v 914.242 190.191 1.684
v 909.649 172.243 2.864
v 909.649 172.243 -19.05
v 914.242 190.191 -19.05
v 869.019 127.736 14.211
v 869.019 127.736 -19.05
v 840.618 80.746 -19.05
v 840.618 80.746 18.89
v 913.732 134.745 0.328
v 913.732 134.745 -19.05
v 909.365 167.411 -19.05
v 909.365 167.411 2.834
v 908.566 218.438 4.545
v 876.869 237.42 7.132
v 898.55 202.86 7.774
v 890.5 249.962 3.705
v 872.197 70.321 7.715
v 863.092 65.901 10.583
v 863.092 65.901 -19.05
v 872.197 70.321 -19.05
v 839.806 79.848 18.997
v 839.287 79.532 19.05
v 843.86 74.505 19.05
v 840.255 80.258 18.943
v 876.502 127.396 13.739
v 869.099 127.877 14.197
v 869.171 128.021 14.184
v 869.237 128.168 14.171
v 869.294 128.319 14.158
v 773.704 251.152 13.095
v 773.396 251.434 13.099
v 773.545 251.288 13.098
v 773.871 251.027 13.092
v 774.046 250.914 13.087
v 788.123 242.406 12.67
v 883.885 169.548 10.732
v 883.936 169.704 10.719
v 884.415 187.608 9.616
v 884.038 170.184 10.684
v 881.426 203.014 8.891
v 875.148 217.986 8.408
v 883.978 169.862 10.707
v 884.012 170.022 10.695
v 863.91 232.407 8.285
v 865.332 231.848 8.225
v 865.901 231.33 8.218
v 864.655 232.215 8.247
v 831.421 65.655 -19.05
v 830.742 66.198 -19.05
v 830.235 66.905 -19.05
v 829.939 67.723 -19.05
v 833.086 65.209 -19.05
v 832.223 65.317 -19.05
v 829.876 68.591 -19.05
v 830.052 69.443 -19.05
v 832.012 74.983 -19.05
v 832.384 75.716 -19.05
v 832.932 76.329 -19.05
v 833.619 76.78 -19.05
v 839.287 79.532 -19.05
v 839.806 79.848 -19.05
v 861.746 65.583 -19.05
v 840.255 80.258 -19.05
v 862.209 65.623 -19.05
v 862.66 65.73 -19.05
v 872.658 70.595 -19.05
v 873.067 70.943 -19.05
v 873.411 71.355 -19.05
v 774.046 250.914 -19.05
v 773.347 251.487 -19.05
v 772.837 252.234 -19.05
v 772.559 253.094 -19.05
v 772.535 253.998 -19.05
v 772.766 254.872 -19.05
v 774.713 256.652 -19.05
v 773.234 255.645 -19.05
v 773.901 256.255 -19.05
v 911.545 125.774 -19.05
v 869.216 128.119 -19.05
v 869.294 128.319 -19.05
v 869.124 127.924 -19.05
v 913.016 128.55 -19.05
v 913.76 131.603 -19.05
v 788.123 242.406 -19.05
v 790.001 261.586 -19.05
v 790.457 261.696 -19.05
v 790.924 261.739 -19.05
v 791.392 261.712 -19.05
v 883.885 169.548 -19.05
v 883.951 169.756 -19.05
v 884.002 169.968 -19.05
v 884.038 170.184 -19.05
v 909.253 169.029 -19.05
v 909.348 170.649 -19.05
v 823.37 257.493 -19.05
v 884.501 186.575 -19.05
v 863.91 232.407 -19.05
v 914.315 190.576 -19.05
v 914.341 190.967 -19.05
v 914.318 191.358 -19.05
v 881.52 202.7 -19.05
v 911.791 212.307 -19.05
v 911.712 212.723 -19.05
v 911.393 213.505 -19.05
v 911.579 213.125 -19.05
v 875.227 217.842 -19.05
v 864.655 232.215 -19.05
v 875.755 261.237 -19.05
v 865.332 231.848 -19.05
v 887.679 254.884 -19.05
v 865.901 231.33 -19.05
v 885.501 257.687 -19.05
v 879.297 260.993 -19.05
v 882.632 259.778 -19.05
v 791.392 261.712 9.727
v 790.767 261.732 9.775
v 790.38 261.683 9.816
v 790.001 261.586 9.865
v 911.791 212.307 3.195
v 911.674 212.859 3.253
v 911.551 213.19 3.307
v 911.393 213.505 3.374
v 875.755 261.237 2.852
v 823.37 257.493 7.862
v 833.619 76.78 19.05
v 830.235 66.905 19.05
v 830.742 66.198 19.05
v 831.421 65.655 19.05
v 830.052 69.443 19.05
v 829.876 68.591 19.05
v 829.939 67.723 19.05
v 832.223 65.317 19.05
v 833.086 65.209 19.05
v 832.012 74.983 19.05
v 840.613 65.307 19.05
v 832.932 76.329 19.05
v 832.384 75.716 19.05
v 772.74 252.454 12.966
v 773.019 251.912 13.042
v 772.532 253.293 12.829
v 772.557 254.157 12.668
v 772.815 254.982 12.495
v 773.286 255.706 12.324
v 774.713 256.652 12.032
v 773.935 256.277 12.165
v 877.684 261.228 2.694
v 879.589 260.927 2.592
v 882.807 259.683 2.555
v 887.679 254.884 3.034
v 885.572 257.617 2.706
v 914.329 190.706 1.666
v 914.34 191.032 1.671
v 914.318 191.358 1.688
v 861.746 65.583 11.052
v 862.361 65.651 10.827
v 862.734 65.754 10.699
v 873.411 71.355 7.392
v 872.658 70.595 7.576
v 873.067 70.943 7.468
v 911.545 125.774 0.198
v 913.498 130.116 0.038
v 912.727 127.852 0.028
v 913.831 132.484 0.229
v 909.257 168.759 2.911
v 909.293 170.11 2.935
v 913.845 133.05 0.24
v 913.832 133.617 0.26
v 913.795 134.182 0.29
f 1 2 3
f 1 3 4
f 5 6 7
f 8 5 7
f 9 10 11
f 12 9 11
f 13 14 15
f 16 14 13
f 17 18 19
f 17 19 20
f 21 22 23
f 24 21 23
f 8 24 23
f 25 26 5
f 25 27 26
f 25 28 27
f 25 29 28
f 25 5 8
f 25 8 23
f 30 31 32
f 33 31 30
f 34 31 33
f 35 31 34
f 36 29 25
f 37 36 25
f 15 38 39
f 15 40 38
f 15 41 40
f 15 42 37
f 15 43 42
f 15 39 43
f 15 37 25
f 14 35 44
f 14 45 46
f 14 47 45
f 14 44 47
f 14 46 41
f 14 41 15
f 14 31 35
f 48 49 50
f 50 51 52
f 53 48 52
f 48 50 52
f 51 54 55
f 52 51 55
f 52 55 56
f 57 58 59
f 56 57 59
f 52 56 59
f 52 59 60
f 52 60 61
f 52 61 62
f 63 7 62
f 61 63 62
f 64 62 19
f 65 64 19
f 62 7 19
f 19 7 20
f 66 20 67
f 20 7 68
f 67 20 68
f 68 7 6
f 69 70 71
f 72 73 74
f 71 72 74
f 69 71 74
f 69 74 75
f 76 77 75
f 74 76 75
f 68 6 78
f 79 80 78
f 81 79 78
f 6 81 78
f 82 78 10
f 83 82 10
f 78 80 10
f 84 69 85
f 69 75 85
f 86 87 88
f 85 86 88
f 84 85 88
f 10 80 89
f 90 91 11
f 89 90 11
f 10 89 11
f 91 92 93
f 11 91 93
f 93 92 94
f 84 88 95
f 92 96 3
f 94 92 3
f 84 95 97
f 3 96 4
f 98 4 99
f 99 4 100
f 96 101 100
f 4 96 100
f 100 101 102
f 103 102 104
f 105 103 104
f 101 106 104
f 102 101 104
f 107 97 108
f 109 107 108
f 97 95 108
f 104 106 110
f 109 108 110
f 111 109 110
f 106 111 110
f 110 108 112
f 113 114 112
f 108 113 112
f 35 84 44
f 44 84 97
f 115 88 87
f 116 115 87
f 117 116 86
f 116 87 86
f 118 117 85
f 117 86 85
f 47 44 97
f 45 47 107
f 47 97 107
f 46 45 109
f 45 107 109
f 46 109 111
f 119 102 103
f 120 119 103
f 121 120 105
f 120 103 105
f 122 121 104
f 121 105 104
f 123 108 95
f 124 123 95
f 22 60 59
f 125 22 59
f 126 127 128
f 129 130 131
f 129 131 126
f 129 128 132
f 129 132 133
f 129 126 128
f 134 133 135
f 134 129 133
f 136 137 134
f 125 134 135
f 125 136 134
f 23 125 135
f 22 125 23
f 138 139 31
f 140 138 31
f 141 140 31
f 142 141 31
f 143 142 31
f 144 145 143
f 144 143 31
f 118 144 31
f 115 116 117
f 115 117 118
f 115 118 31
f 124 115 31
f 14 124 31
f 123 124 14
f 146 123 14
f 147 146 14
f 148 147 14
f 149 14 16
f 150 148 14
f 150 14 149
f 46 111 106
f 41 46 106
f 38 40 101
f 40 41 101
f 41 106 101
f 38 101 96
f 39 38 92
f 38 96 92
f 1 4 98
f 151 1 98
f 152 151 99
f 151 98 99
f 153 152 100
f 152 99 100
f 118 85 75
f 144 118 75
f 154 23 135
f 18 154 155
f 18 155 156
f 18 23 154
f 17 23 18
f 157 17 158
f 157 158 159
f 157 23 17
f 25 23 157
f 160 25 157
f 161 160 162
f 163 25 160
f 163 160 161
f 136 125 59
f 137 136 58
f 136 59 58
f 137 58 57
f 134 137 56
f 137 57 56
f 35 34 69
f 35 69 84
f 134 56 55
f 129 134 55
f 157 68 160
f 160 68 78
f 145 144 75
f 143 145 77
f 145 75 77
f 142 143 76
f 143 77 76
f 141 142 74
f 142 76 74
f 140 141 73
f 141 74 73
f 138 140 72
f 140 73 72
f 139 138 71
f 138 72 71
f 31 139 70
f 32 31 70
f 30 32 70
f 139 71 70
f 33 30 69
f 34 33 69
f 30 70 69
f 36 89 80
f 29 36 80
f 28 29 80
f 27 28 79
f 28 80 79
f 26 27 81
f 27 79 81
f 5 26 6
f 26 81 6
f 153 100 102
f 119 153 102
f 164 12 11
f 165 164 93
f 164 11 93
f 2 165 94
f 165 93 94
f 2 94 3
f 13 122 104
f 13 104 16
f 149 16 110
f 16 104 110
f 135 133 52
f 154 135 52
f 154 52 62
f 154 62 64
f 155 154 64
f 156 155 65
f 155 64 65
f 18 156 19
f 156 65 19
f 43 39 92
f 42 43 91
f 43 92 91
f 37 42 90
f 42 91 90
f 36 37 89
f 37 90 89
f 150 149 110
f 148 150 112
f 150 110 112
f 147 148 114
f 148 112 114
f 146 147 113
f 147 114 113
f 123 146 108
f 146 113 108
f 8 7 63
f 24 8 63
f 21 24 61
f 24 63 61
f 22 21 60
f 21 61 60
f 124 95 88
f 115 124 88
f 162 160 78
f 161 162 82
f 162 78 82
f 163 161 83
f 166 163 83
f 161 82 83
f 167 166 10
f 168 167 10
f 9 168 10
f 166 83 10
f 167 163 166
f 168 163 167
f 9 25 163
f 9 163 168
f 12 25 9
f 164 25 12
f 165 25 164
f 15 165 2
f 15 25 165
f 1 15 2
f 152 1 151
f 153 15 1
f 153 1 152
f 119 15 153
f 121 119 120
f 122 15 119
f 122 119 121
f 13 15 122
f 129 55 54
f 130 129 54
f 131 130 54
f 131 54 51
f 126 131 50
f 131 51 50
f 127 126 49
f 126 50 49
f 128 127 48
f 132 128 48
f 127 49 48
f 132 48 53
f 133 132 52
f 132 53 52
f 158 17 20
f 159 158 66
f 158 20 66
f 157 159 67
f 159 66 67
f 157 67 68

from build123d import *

# Parameters (mm, degrees)
BOSS_EXTRUDE1_DEPTH      = 19.05
BOSS_EXTRUDE1_DEPTH_BACK = 19.05
SKETCH4_W                = 186.379734437
SKETCH4_H                = 233.28599277
CUT_EXTRUDE1_DEPTH       = 950.835438404
SKETCH7_W                = 231.95079804
SKETCH7_H                = 221.677656062
CUT_EXTRUDE2_DEPTH       = 946.905059587
SKETCH11_W               = 173.814101514
SKETCH11_H               = 248.849814079
CUT_EXTRUDE4_DEPTH       = 941.51899366
SKETCH14_W               = 196.129851378
SKETCH14_H               = 225.619542635
CUT_EXTRUDE5_DEPTH       = 907.478686006
SKETCH17_W               = 176.819121146
SKETCH17_H               = 184.843776095
CUT_EXTRUDE6_DEPTH       = 913.1190158


with BuildPart() as part:
    # Sketch1 → Boss-Extrude1 (new, two sides: drawn at the far end of the back side and taken through both)
    with BuildSketch(Plane.XY.offset(-BOSS_EXTRUDE1_DEPTH_BACK)):
        with BuildLine():
            Line((832.012207401, 74.98328443), (830.051592511, 69.443138151))
            ThreePointArc((830.051592511, 69.443138151), (830.464037195, 66.534350889), (833.086070249, 65.20917293))
            Line((833.086070249, 65.20917293), (861.746459213, 65.582718771))
            ThreePointArc((861.746459213, 65.582718771), (862.436541417, 65.667855132), (863.091543165, 65.90116685))
            Line((863.091543165, 65.90116685), (872.196833975, 70.320946588))
            ThreePointArc((872.196833975, 70.320946588), (872.869650438, 70.760620145), (873.410502549, 71.355156792))
            Line((873.410502549, 71.355156792), (911.54502985, 125.773830324))
            ThreePointArc((911.54502985, 125.773830324), (913.483046359, 130.053718288), (913.732471748, 134.745320994))
            Line((913.732471748, 134.745320994), (909.364571394, 167.411013692))
            ThreePointArc((909.364571394, 167.411013692), (909.274481854, 169.840517815), (909.648990135, 172.242673089))
            Line((909.648990135, 172.242673089), (914.241820235, 190.190541175))
            ThreePointArc((914.241820235, 190.190541175), (914.334181602, 190.770696206), (914.318077922, 191.357936492))
            Line((914.318077922, 191.357936492), (911.790756949, 212.30686176))
            ThreePointArc((911.790756949, 212.30686176), (911.6522039, 212.92602807), (911.39330486, 213.505282035))
            Line((911.39330486, 213.505282035), (887.679344514, 254.884009975))
            ThreePointArc((887.679344514, 254.884009975), (882.632176652, 259.777683565), (875.755211166, 261.236892374))
            Line((875.755211166, 261.236892374), (823.370254465, 257.492913183))
            Line((823.370254465, 257.492913183), (791.391520556, 261.712016844))
            ThreePointArc((791.391520556, 261.712016844), (790.689315821, 261.726304443), (790.001151085, 261.585859009))
            Line((790.001151085, 261.585859009), (774.713390941, 256.652413374))
            ThreePointArc((774.713390941, 256.652413374), (772.534709623, 253.997511187), (774.046182712, 250.913583981))
            Line((774.046182712, 250.913583981), (788.122630404, 242.405939005))
            Line((788.122630404, 242.405939005), (863.909526126, 232.407020034))
            ThreePointArc((863.909526126, 232.407020034), (865.004538197, 232.052074317), (865.901029602, 231.330034804))
            ThreePointArc((865.901029602, 231.330034804), (881.520213, 202.699806258), (884.038410967, 170.183540241))
            ThreePointArc((884.038410967, 170.183540241), (883.978058807, 169.861693272), (883.884877802, 169.547774246))
            Line((883.884877802, 169.547774246), (869.294437604, 128.319293639))
            ThreePointArc((869.294437604, 128.319293639), (869.171364398, 128.020746389), (869.018602643, 127.736244508))
            Line((869.018602643, 127.736244508), (840.618152355, 80.745866559))
            ThreePointArc((840.618152355, 80.745866559), (840.040651792, 80.042509109), (839.287349373, 79.531868269))
            Line((839.287349373, 79.531868269), (833.618845344, 76.780331852))
            ThreePointArc((833.618845344, 76.780331852), (832.638350308, 76.040211187), (832.012207401, 74.98328443))
        make_face()
    extrude(amount=BOSS_EXTRUDE1_DEPTH + BOSS_EXTRUDE1_DEPTH_BACK)

    # Sketch4 → Cut-Extrude1 (cut, through all)
    with BuildSketch(Plane(origin=(5.154747967, 4.689434257, 78.383097783), x_dir=(0.9978522316377796, -0.003911988654162224, -0.06538822646526604), z_dir=(0.06550514342785009, 0.05959206261409093, 0.9960712134470584))):
        with Locations((842.981546385, 161.984148681)):
            Rectangle(SKETCH4_W, SKETCH4_H)
    extrude(amount=CUT_EXTRUDE1_DEPTH, mode=Mode.SUBTRACT)

    # Sketch7 → Cut-Extrude2 (cut, through all)
    with BuildSketch(Plane(origin=(9.762038751, 21.716896374, 118.29137191), x_dir=(0.9953503159229875, -0.06617162100827076, -0.06999332228967761), z_dir=(0.08090274831952654, 0.17997844984324457, 0.9803379534152342))):
        with Locations((824.773818159, 194.950225871)):
            Rectangle(SKETCH7_W, SKETCH7_H)
    extrude(amount=CUT_EXTRUDE2_DEPTH, mode=Mode.SUBTRACT)

    # Sketch11 → Cut-Extrude4 (cut, through all)
    with BuildSketch(Plane(origin=(23.549231024, 17.716627358, 158.48607319), x_dir=(0.988547763362636, -0.054240482201212636, -0.14082361180324135), z_dir=(0.14608467838170588, 0.1099028586949763, 0.983148324716462))):
        with Locations((809.66383823, 157.140332284)):
            Rectangle(SKETCH11_W, SKETCH11_H)
    extrude(amount=CUT_EXTRUDE4_DEPTH, mode=Mode.SUBTRACT)

    # Sketch14 → Cut-Extrude5 (cut, through all)
    with BuildSketch(Plane(origin=(106.606514907, -8.105609994, 291.517937711), x_dir=(0.9391673216400718, 0.019492950361294347, -0.3429063528860705), z_dir=(0.3433326783617723, -0.026104603375052715, 0.9388510114238378))):
        with Locations((805.668145938, 138.128050957)):
            Rectangle(SKETCH14_W, SKETCH14_H)
    extrude(amount=CUT_EXTRUDE5_DEPTH, mode=Mode.SUBTRACT)

    # Sketch17 → Cut-Extrude6 (cut, through all)
    with BuildSketch(Plane(origin=(107.883108977, -38.087973047, 283.754367701), x_dir=(0.9357682343427207, 0.04691042077342712, -0.34948136433573534), z_dir=(0.3526156712273392, -0.12449044441681217, 0.9274504394595959))):
        with Locations((808.154549648, 102.775727883)):
            Rectangle(SKETCH17_W, SKETCH17_H)
    extrude(amount=CUT_EXTRUDE6_DEPTH, mode=Mode.SUBTRACT)


solid = part.part
